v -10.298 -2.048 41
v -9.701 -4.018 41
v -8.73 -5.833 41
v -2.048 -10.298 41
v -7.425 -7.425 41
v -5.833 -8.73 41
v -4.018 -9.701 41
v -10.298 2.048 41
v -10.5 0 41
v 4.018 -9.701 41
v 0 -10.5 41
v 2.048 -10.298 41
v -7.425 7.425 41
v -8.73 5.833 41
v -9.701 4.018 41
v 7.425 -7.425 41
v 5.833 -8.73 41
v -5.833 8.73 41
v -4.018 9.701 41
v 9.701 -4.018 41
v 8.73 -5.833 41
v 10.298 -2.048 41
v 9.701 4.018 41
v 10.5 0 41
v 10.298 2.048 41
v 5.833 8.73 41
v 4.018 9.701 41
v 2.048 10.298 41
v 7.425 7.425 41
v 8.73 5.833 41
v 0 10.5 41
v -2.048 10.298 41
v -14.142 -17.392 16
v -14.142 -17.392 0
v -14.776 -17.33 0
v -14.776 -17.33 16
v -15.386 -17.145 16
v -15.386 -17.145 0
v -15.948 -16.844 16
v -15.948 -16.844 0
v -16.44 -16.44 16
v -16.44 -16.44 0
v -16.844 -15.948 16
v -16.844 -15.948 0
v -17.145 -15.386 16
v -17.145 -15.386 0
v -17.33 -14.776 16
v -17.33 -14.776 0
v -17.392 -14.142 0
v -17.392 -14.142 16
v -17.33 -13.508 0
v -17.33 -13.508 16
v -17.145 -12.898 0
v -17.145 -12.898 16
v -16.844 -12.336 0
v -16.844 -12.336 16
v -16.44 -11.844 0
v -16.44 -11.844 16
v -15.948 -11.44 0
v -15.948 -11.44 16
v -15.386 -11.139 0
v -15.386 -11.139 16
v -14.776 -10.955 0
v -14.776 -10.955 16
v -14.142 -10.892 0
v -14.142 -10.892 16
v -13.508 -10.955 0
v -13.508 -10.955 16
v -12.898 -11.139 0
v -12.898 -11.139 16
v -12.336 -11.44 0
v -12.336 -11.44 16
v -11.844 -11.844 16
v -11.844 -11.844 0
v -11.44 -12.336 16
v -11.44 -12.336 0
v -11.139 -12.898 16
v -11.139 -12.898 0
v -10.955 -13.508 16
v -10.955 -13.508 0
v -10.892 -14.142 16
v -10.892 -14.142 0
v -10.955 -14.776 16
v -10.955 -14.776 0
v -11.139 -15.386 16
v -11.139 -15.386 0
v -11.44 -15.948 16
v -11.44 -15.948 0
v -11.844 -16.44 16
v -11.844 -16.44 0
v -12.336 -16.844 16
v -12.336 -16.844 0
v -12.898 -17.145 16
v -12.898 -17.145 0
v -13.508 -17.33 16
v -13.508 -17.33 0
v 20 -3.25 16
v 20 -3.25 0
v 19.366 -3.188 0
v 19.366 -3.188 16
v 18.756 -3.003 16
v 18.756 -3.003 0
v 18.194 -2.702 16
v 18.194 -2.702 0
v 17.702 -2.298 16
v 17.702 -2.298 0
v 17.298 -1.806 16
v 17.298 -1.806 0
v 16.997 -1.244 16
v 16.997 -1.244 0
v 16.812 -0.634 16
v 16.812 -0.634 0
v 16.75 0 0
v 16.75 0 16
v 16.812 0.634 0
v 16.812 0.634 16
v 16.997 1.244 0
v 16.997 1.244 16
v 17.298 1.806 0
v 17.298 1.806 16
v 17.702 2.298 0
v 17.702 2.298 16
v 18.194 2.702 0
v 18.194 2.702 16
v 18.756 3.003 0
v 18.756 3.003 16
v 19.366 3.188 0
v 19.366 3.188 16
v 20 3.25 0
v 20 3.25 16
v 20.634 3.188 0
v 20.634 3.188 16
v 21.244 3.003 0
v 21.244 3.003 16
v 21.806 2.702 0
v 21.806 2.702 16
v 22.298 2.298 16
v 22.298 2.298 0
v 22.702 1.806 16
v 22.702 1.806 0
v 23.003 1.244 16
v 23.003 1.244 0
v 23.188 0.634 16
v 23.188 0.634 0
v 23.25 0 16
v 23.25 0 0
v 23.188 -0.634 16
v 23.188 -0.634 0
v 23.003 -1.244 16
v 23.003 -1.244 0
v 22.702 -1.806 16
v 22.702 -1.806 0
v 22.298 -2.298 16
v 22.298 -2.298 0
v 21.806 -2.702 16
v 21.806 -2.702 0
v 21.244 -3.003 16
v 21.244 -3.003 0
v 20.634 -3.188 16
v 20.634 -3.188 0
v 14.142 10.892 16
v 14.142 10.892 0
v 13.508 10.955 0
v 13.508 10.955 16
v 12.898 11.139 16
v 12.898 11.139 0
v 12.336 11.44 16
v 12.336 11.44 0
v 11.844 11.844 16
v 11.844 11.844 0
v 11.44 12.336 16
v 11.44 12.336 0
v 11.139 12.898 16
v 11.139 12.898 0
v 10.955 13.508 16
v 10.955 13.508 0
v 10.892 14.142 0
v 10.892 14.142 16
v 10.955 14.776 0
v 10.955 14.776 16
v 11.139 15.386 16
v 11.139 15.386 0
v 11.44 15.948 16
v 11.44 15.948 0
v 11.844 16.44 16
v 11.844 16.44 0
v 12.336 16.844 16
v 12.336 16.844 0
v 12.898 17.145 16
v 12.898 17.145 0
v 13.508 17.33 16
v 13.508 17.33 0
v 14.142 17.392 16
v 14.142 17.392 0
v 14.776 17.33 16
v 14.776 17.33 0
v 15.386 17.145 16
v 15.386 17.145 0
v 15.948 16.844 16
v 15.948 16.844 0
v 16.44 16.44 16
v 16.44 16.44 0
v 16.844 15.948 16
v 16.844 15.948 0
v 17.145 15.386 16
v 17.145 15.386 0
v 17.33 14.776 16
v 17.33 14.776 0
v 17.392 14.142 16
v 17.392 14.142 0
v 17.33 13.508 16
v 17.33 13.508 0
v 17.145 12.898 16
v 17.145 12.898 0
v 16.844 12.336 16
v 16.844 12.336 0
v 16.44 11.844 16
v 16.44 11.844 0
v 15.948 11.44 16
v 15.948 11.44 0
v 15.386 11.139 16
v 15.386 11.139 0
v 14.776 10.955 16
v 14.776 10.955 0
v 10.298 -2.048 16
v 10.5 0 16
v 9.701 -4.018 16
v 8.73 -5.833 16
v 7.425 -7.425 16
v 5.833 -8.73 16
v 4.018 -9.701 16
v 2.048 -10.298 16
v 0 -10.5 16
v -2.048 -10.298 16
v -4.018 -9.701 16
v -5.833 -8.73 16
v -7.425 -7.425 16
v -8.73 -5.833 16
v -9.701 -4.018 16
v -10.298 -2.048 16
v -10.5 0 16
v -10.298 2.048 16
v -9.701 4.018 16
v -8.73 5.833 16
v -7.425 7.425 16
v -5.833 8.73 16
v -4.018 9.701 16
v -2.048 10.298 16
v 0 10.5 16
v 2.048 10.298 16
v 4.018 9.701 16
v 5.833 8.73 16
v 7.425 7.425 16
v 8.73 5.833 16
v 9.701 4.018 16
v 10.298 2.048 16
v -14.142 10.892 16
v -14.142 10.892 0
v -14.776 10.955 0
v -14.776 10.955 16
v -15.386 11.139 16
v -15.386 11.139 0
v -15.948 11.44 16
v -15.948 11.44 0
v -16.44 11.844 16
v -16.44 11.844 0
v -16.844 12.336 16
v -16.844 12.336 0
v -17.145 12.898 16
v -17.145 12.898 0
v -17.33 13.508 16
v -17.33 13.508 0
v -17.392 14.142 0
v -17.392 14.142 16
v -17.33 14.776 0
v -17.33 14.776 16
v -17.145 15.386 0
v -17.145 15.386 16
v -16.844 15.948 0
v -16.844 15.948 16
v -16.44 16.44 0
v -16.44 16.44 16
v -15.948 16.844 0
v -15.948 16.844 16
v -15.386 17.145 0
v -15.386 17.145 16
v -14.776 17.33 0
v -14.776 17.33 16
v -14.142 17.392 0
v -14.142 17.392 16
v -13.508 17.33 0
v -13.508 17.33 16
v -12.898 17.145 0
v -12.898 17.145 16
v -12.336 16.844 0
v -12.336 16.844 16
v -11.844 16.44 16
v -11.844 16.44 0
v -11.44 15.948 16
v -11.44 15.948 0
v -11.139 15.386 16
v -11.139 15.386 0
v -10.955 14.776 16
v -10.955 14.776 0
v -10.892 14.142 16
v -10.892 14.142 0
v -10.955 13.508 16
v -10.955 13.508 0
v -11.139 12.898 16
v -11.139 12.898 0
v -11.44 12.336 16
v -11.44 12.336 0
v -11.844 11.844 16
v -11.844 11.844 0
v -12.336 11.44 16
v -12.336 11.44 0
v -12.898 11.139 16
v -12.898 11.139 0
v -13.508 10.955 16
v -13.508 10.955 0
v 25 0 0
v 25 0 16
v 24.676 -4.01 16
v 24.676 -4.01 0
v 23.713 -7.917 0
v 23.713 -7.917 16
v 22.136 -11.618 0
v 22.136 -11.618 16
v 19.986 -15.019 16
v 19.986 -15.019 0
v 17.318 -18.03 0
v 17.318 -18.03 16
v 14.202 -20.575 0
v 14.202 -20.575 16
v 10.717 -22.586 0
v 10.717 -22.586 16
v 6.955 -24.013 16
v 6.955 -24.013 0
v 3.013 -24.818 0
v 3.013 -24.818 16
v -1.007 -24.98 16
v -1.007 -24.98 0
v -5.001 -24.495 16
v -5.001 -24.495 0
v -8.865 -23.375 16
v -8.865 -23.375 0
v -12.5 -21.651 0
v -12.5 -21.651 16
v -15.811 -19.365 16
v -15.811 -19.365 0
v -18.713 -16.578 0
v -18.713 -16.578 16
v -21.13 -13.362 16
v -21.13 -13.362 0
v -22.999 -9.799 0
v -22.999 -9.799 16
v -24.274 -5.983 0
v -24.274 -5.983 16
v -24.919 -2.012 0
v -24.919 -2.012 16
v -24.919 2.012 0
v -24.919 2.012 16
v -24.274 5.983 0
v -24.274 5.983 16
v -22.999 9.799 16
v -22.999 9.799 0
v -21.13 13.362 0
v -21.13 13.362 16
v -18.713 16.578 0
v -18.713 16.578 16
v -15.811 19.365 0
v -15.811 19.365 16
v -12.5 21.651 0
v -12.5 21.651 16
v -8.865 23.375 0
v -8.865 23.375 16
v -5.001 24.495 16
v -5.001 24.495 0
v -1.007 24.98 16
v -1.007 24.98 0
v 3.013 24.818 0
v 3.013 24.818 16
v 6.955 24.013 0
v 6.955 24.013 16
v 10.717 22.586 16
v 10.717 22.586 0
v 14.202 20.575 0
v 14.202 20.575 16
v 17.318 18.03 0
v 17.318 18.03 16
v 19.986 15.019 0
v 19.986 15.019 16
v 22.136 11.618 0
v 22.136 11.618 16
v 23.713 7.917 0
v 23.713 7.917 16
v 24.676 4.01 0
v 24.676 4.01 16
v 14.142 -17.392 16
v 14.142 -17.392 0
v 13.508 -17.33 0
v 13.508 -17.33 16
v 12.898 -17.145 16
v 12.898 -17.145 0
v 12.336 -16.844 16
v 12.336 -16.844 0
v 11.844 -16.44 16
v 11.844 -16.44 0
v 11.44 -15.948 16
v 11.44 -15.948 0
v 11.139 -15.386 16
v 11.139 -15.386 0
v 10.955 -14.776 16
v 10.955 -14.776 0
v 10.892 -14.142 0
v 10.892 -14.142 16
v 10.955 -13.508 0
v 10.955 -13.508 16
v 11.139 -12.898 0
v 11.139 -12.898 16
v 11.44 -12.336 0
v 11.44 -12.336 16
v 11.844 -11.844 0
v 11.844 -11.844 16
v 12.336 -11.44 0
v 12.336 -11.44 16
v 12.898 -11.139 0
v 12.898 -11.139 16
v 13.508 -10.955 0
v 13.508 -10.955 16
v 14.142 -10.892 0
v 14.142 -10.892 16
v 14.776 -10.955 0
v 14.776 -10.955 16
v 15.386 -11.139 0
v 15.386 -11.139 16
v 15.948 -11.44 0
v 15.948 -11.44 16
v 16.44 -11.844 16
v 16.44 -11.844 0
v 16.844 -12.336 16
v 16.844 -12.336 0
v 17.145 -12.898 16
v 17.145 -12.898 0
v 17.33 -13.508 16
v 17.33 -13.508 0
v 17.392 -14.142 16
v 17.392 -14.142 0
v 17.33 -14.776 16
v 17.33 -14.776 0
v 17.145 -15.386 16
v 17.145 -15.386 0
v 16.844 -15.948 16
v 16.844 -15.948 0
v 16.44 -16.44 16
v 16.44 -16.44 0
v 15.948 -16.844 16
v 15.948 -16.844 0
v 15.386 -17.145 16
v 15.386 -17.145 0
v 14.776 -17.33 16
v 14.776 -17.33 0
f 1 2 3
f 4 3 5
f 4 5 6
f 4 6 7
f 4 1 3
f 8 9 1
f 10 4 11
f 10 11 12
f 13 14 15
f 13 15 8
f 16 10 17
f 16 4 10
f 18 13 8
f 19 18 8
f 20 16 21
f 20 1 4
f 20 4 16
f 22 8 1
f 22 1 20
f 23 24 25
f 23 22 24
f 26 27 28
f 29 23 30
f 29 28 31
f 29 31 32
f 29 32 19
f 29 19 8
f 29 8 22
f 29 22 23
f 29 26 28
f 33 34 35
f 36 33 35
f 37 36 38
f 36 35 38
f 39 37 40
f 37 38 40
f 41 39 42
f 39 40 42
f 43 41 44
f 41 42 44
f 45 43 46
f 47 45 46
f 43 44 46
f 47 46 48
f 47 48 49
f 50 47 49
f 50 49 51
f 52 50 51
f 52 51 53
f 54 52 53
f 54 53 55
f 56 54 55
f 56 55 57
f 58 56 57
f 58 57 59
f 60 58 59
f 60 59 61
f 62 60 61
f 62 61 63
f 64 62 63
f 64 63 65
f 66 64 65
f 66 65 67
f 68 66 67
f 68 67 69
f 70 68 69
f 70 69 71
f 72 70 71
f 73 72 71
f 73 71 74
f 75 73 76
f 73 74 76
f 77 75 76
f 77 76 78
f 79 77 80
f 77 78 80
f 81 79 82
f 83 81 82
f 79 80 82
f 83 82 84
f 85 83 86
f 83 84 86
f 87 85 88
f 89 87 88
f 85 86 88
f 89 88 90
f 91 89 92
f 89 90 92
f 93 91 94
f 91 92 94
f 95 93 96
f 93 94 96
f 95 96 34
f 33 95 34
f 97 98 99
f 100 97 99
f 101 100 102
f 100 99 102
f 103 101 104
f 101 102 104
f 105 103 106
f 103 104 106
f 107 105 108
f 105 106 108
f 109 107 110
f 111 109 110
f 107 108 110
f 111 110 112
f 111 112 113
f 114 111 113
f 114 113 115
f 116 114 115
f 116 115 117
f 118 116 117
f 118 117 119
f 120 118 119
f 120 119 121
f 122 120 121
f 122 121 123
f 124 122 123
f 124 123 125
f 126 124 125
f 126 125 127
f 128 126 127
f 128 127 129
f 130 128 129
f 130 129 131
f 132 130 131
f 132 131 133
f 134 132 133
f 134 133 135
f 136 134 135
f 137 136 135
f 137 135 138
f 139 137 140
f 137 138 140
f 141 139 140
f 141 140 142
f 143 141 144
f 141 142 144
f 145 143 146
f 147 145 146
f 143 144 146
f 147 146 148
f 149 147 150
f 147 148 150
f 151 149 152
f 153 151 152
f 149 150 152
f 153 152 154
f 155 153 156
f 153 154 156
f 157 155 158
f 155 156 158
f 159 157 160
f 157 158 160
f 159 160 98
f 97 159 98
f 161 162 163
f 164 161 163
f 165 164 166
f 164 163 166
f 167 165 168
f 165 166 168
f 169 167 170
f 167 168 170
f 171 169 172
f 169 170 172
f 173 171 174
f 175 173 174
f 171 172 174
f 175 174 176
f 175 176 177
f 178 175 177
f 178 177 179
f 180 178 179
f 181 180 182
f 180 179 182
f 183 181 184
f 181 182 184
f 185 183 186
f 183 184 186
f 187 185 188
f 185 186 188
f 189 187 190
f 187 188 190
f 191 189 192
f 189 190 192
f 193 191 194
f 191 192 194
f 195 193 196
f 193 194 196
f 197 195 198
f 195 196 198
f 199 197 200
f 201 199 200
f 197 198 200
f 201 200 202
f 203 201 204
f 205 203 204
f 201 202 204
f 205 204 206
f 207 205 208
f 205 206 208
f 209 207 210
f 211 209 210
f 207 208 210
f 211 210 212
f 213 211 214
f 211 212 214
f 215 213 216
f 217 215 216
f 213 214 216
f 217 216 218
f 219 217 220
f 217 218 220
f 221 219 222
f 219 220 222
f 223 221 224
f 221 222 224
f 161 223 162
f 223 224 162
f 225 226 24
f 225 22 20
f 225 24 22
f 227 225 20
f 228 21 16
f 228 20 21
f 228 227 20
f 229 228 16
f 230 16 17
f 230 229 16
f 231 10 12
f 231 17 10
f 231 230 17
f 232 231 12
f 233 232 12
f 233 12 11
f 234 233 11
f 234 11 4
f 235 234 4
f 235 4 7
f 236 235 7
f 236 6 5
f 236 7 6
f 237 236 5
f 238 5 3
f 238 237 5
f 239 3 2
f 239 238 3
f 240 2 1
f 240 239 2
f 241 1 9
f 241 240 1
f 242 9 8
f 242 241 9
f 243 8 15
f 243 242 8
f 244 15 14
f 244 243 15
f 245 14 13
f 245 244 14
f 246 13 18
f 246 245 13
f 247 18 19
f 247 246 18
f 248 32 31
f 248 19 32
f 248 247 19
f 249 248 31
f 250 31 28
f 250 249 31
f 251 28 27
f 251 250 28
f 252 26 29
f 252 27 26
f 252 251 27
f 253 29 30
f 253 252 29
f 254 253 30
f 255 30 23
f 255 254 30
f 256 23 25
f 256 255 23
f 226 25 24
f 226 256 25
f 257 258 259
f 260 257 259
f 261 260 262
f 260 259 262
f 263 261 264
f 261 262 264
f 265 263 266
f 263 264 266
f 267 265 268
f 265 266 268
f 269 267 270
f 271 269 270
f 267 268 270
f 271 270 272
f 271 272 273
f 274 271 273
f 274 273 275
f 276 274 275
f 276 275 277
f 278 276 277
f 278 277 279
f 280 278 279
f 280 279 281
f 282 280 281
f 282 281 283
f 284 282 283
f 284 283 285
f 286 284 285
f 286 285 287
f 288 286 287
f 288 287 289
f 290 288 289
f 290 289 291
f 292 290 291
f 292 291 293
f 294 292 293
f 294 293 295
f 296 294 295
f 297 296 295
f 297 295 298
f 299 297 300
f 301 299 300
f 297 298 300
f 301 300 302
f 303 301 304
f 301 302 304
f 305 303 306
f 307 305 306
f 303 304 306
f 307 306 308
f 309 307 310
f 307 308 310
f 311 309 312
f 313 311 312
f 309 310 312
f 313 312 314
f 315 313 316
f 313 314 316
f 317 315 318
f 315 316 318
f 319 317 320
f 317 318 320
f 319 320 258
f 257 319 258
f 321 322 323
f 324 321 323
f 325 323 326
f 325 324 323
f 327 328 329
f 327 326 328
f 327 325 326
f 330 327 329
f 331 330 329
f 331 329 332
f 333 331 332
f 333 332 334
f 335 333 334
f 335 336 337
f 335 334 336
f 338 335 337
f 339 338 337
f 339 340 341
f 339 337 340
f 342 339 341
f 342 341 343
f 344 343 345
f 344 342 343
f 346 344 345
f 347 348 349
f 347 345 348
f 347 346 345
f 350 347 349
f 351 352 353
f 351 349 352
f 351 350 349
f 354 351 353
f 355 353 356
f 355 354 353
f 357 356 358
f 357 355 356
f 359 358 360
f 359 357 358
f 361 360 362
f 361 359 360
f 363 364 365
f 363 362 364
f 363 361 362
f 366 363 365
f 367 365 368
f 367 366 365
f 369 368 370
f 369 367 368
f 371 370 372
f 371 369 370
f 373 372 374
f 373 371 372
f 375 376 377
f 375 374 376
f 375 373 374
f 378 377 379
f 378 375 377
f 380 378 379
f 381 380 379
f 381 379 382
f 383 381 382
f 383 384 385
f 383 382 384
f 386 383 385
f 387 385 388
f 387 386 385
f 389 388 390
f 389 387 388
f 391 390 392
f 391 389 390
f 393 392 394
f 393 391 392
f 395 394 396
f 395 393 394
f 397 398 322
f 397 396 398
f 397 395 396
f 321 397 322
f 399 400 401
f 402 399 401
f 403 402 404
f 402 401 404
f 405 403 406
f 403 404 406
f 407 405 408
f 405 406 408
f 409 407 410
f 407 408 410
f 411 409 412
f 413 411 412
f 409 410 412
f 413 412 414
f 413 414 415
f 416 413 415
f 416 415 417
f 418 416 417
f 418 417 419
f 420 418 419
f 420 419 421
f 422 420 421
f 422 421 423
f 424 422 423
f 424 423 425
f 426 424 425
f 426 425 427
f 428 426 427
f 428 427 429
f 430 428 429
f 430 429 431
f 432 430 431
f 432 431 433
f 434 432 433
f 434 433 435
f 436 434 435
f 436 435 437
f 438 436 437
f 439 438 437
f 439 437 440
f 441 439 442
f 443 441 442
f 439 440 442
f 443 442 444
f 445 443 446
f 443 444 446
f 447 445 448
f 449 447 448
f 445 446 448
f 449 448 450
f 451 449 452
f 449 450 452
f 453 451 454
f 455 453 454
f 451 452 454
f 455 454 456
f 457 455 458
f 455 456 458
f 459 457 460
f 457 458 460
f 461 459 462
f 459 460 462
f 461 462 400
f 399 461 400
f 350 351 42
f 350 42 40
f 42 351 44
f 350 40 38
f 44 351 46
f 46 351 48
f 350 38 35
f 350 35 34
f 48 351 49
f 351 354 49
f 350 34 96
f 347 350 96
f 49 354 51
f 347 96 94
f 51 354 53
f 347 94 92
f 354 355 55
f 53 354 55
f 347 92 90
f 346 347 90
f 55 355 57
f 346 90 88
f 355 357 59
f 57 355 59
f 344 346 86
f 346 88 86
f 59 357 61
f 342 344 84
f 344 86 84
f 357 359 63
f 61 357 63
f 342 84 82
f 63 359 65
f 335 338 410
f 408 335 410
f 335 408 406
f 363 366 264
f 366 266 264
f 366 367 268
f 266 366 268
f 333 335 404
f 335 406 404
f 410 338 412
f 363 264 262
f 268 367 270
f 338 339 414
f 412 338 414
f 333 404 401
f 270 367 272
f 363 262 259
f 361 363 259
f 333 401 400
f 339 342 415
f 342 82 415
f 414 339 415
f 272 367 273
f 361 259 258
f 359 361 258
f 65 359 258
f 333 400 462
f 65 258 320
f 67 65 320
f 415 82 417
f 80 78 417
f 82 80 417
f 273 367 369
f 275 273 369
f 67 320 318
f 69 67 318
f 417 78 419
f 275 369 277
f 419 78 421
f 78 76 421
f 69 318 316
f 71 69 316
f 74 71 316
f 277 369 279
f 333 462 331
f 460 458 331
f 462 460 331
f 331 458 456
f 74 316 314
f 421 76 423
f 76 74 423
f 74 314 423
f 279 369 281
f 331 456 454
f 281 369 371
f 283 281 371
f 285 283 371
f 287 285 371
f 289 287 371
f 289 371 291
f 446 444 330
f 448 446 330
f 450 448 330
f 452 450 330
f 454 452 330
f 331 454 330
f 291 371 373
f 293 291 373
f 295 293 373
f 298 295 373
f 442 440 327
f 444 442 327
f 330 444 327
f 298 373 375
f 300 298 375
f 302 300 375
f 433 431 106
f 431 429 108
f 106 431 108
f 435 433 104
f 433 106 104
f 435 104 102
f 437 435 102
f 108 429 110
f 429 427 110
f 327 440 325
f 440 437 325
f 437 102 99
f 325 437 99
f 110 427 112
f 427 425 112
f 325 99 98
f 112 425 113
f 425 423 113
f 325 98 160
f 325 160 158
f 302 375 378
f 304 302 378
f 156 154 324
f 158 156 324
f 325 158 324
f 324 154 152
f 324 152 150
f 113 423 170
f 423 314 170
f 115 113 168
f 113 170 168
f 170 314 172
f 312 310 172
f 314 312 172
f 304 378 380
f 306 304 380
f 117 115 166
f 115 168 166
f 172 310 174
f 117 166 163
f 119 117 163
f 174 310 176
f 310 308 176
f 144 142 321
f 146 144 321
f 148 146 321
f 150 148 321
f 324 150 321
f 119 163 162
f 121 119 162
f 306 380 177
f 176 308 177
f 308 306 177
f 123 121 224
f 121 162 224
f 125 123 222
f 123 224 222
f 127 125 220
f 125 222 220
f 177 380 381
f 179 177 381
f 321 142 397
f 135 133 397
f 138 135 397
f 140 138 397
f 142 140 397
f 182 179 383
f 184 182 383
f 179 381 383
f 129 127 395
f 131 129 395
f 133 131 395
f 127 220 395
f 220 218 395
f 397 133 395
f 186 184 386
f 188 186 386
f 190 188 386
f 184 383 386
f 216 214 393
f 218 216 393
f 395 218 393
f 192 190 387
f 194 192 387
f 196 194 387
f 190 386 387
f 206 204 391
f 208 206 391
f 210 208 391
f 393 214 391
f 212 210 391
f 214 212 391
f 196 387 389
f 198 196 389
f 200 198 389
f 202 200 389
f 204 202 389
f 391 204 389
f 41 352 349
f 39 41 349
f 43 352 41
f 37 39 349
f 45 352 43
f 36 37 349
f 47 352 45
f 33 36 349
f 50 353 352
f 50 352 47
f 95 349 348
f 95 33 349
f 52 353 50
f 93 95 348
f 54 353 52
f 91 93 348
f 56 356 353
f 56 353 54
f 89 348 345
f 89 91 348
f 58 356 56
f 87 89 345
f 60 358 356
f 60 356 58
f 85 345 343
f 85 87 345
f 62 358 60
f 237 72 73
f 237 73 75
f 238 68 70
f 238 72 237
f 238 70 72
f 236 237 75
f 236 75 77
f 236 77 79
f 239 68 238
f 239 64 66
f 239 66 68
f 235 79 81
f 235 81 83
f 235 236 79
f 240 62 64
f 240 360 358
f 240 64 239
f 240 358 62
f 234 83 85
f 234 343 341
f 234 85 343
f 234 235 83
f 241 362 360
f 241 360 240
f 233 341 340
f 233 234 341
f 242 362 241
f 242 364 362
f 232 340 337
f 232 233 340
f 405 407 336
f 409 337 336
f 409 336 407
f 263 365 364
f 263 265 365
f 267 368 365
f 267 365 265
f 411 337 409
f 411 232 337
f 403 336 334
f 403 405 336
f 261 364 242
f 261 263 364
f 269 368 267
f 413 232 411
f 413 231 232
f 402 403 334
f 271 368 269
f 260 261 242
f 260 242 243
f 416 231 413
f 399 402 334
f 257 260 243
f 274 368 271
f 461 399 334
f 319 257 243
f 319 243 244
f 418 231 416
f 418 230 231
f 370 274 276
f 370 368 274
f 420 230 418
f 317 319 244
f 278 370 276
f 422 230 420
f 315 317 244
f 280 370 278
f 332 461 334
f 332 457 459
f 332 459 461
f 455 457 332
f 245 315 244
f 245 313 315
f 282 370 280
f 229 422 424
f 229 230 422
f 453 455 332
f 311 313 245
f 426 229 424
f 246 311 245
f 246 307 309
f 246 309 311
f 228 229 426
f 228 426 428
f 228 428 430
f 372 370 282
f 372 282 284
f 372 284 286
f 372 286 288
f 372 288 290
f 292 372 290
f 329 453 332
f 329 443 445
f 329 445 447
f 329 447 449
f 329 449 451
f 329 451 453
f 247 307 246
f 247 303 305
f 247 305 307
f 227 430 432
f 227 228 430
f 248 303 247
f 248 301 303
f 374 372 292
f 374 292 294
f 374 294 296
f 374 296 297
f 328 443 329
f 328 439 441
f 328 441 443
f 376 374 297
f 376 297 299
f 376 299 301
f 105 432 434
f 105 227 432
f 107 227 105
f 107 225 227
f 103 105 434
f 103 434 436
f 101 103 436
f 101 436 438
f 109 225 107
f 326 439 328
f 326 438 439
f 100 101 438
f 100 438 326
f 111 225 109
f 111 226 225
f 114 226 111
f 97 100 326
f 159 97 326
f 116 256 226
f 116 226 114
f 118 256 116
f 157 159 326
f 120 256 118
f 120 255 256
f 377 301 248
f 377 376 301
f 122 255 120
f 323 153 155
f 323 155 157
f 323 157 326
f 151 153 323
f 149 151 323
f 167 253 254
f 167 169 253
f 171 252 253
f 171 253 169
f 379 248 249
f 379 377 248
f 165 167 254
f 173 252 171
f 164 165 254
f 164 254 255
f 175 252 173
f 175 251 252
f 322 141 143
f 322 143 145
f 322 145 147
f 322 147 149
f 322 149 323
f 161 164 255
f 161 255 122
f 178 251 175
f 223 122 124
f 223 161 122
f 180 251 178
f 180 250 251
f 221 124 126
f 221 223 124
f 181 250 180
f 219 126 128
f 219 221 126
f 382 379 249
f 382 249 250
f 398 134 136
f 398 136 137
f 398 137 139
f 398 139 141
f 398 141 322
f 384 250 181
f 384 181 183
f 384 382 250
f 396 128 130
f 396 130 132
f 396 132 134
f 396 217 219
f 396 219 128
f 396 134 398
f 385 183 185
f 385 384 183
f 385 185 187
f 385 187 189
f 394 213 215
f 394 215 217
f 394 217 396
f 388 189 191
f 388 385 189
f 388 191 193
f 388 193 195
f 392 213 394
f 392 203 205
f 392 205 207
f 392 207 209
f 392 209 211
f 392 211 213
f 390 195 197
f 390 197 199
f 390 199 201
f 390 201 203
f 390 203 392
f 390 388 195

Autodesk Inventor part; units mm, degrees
ref_plane "YZ Plane" through (0, 0, 0) normal (1, 0, 0) x (0, 1, 0)
ref_plane "XZ Plane" through (0, 0, 0) normal (0, 1, 0) x (-1, 0, 0)
ref_plane "XY Plane" through (0, 0, 0) normal (0, 0, 1) x (1, 0, 0)
sketch "Sketch1" plane through (0, 0, 0) normal (0, 0, 1) x (1, 0, 0)
  circle A0 centre (0, 0) radius 25
  line L0 (0, 0) -> (20, 0) construction
  dimension "d0" = 50
  dimension "d1" = 20
extrude "Extrusion1" add sketch "Sketch1" along normal blind 16
sketch "Sketch2" plane through (0, 0, 16) normal (0, 0, 1) x (1, 0, 0)
  circle A0 centre (0, 0) radius 25 projected
  point P0 (-14.1421, 14.1421)
  point P1 (-14.1421, -14.1421)
  point P2 (14.1421, -14.1421)
  point P3 (14.1421, 14.1421)
  dimension "d18" = 360
hole "Hole1" at (-14.1421, 14.1421, 16) at (-14.1421, -14.1421, 16) at (14.1421, -14.1421, 16) at (14.1421, 14.1421, 16) direction (0, 0, -1) diameter 6.5 end through all
sketch "Sketch11" plane through (0, 0, 16) normal (0, 0, 1) x (1, 0, 0)
  line L0 (0, 0) -> (20, 0)
  dimension "d68" = 20
hole "Hole4" at (20, 0, 16) direction (0, 0, -1) diameter 6.5 end through all
sketch "Sketch12" plane through (0, 0, 16) normal (0, 0, 1) x (1, 0, 0)
  circle A0 centre (0, 0) radius 10.5
  dimension "d76" = 21
extrude "Extrusion7" add sketch "Sketch12" along normal blind 25
properties part number "BaseImpresion" material "PVC-Piping"
